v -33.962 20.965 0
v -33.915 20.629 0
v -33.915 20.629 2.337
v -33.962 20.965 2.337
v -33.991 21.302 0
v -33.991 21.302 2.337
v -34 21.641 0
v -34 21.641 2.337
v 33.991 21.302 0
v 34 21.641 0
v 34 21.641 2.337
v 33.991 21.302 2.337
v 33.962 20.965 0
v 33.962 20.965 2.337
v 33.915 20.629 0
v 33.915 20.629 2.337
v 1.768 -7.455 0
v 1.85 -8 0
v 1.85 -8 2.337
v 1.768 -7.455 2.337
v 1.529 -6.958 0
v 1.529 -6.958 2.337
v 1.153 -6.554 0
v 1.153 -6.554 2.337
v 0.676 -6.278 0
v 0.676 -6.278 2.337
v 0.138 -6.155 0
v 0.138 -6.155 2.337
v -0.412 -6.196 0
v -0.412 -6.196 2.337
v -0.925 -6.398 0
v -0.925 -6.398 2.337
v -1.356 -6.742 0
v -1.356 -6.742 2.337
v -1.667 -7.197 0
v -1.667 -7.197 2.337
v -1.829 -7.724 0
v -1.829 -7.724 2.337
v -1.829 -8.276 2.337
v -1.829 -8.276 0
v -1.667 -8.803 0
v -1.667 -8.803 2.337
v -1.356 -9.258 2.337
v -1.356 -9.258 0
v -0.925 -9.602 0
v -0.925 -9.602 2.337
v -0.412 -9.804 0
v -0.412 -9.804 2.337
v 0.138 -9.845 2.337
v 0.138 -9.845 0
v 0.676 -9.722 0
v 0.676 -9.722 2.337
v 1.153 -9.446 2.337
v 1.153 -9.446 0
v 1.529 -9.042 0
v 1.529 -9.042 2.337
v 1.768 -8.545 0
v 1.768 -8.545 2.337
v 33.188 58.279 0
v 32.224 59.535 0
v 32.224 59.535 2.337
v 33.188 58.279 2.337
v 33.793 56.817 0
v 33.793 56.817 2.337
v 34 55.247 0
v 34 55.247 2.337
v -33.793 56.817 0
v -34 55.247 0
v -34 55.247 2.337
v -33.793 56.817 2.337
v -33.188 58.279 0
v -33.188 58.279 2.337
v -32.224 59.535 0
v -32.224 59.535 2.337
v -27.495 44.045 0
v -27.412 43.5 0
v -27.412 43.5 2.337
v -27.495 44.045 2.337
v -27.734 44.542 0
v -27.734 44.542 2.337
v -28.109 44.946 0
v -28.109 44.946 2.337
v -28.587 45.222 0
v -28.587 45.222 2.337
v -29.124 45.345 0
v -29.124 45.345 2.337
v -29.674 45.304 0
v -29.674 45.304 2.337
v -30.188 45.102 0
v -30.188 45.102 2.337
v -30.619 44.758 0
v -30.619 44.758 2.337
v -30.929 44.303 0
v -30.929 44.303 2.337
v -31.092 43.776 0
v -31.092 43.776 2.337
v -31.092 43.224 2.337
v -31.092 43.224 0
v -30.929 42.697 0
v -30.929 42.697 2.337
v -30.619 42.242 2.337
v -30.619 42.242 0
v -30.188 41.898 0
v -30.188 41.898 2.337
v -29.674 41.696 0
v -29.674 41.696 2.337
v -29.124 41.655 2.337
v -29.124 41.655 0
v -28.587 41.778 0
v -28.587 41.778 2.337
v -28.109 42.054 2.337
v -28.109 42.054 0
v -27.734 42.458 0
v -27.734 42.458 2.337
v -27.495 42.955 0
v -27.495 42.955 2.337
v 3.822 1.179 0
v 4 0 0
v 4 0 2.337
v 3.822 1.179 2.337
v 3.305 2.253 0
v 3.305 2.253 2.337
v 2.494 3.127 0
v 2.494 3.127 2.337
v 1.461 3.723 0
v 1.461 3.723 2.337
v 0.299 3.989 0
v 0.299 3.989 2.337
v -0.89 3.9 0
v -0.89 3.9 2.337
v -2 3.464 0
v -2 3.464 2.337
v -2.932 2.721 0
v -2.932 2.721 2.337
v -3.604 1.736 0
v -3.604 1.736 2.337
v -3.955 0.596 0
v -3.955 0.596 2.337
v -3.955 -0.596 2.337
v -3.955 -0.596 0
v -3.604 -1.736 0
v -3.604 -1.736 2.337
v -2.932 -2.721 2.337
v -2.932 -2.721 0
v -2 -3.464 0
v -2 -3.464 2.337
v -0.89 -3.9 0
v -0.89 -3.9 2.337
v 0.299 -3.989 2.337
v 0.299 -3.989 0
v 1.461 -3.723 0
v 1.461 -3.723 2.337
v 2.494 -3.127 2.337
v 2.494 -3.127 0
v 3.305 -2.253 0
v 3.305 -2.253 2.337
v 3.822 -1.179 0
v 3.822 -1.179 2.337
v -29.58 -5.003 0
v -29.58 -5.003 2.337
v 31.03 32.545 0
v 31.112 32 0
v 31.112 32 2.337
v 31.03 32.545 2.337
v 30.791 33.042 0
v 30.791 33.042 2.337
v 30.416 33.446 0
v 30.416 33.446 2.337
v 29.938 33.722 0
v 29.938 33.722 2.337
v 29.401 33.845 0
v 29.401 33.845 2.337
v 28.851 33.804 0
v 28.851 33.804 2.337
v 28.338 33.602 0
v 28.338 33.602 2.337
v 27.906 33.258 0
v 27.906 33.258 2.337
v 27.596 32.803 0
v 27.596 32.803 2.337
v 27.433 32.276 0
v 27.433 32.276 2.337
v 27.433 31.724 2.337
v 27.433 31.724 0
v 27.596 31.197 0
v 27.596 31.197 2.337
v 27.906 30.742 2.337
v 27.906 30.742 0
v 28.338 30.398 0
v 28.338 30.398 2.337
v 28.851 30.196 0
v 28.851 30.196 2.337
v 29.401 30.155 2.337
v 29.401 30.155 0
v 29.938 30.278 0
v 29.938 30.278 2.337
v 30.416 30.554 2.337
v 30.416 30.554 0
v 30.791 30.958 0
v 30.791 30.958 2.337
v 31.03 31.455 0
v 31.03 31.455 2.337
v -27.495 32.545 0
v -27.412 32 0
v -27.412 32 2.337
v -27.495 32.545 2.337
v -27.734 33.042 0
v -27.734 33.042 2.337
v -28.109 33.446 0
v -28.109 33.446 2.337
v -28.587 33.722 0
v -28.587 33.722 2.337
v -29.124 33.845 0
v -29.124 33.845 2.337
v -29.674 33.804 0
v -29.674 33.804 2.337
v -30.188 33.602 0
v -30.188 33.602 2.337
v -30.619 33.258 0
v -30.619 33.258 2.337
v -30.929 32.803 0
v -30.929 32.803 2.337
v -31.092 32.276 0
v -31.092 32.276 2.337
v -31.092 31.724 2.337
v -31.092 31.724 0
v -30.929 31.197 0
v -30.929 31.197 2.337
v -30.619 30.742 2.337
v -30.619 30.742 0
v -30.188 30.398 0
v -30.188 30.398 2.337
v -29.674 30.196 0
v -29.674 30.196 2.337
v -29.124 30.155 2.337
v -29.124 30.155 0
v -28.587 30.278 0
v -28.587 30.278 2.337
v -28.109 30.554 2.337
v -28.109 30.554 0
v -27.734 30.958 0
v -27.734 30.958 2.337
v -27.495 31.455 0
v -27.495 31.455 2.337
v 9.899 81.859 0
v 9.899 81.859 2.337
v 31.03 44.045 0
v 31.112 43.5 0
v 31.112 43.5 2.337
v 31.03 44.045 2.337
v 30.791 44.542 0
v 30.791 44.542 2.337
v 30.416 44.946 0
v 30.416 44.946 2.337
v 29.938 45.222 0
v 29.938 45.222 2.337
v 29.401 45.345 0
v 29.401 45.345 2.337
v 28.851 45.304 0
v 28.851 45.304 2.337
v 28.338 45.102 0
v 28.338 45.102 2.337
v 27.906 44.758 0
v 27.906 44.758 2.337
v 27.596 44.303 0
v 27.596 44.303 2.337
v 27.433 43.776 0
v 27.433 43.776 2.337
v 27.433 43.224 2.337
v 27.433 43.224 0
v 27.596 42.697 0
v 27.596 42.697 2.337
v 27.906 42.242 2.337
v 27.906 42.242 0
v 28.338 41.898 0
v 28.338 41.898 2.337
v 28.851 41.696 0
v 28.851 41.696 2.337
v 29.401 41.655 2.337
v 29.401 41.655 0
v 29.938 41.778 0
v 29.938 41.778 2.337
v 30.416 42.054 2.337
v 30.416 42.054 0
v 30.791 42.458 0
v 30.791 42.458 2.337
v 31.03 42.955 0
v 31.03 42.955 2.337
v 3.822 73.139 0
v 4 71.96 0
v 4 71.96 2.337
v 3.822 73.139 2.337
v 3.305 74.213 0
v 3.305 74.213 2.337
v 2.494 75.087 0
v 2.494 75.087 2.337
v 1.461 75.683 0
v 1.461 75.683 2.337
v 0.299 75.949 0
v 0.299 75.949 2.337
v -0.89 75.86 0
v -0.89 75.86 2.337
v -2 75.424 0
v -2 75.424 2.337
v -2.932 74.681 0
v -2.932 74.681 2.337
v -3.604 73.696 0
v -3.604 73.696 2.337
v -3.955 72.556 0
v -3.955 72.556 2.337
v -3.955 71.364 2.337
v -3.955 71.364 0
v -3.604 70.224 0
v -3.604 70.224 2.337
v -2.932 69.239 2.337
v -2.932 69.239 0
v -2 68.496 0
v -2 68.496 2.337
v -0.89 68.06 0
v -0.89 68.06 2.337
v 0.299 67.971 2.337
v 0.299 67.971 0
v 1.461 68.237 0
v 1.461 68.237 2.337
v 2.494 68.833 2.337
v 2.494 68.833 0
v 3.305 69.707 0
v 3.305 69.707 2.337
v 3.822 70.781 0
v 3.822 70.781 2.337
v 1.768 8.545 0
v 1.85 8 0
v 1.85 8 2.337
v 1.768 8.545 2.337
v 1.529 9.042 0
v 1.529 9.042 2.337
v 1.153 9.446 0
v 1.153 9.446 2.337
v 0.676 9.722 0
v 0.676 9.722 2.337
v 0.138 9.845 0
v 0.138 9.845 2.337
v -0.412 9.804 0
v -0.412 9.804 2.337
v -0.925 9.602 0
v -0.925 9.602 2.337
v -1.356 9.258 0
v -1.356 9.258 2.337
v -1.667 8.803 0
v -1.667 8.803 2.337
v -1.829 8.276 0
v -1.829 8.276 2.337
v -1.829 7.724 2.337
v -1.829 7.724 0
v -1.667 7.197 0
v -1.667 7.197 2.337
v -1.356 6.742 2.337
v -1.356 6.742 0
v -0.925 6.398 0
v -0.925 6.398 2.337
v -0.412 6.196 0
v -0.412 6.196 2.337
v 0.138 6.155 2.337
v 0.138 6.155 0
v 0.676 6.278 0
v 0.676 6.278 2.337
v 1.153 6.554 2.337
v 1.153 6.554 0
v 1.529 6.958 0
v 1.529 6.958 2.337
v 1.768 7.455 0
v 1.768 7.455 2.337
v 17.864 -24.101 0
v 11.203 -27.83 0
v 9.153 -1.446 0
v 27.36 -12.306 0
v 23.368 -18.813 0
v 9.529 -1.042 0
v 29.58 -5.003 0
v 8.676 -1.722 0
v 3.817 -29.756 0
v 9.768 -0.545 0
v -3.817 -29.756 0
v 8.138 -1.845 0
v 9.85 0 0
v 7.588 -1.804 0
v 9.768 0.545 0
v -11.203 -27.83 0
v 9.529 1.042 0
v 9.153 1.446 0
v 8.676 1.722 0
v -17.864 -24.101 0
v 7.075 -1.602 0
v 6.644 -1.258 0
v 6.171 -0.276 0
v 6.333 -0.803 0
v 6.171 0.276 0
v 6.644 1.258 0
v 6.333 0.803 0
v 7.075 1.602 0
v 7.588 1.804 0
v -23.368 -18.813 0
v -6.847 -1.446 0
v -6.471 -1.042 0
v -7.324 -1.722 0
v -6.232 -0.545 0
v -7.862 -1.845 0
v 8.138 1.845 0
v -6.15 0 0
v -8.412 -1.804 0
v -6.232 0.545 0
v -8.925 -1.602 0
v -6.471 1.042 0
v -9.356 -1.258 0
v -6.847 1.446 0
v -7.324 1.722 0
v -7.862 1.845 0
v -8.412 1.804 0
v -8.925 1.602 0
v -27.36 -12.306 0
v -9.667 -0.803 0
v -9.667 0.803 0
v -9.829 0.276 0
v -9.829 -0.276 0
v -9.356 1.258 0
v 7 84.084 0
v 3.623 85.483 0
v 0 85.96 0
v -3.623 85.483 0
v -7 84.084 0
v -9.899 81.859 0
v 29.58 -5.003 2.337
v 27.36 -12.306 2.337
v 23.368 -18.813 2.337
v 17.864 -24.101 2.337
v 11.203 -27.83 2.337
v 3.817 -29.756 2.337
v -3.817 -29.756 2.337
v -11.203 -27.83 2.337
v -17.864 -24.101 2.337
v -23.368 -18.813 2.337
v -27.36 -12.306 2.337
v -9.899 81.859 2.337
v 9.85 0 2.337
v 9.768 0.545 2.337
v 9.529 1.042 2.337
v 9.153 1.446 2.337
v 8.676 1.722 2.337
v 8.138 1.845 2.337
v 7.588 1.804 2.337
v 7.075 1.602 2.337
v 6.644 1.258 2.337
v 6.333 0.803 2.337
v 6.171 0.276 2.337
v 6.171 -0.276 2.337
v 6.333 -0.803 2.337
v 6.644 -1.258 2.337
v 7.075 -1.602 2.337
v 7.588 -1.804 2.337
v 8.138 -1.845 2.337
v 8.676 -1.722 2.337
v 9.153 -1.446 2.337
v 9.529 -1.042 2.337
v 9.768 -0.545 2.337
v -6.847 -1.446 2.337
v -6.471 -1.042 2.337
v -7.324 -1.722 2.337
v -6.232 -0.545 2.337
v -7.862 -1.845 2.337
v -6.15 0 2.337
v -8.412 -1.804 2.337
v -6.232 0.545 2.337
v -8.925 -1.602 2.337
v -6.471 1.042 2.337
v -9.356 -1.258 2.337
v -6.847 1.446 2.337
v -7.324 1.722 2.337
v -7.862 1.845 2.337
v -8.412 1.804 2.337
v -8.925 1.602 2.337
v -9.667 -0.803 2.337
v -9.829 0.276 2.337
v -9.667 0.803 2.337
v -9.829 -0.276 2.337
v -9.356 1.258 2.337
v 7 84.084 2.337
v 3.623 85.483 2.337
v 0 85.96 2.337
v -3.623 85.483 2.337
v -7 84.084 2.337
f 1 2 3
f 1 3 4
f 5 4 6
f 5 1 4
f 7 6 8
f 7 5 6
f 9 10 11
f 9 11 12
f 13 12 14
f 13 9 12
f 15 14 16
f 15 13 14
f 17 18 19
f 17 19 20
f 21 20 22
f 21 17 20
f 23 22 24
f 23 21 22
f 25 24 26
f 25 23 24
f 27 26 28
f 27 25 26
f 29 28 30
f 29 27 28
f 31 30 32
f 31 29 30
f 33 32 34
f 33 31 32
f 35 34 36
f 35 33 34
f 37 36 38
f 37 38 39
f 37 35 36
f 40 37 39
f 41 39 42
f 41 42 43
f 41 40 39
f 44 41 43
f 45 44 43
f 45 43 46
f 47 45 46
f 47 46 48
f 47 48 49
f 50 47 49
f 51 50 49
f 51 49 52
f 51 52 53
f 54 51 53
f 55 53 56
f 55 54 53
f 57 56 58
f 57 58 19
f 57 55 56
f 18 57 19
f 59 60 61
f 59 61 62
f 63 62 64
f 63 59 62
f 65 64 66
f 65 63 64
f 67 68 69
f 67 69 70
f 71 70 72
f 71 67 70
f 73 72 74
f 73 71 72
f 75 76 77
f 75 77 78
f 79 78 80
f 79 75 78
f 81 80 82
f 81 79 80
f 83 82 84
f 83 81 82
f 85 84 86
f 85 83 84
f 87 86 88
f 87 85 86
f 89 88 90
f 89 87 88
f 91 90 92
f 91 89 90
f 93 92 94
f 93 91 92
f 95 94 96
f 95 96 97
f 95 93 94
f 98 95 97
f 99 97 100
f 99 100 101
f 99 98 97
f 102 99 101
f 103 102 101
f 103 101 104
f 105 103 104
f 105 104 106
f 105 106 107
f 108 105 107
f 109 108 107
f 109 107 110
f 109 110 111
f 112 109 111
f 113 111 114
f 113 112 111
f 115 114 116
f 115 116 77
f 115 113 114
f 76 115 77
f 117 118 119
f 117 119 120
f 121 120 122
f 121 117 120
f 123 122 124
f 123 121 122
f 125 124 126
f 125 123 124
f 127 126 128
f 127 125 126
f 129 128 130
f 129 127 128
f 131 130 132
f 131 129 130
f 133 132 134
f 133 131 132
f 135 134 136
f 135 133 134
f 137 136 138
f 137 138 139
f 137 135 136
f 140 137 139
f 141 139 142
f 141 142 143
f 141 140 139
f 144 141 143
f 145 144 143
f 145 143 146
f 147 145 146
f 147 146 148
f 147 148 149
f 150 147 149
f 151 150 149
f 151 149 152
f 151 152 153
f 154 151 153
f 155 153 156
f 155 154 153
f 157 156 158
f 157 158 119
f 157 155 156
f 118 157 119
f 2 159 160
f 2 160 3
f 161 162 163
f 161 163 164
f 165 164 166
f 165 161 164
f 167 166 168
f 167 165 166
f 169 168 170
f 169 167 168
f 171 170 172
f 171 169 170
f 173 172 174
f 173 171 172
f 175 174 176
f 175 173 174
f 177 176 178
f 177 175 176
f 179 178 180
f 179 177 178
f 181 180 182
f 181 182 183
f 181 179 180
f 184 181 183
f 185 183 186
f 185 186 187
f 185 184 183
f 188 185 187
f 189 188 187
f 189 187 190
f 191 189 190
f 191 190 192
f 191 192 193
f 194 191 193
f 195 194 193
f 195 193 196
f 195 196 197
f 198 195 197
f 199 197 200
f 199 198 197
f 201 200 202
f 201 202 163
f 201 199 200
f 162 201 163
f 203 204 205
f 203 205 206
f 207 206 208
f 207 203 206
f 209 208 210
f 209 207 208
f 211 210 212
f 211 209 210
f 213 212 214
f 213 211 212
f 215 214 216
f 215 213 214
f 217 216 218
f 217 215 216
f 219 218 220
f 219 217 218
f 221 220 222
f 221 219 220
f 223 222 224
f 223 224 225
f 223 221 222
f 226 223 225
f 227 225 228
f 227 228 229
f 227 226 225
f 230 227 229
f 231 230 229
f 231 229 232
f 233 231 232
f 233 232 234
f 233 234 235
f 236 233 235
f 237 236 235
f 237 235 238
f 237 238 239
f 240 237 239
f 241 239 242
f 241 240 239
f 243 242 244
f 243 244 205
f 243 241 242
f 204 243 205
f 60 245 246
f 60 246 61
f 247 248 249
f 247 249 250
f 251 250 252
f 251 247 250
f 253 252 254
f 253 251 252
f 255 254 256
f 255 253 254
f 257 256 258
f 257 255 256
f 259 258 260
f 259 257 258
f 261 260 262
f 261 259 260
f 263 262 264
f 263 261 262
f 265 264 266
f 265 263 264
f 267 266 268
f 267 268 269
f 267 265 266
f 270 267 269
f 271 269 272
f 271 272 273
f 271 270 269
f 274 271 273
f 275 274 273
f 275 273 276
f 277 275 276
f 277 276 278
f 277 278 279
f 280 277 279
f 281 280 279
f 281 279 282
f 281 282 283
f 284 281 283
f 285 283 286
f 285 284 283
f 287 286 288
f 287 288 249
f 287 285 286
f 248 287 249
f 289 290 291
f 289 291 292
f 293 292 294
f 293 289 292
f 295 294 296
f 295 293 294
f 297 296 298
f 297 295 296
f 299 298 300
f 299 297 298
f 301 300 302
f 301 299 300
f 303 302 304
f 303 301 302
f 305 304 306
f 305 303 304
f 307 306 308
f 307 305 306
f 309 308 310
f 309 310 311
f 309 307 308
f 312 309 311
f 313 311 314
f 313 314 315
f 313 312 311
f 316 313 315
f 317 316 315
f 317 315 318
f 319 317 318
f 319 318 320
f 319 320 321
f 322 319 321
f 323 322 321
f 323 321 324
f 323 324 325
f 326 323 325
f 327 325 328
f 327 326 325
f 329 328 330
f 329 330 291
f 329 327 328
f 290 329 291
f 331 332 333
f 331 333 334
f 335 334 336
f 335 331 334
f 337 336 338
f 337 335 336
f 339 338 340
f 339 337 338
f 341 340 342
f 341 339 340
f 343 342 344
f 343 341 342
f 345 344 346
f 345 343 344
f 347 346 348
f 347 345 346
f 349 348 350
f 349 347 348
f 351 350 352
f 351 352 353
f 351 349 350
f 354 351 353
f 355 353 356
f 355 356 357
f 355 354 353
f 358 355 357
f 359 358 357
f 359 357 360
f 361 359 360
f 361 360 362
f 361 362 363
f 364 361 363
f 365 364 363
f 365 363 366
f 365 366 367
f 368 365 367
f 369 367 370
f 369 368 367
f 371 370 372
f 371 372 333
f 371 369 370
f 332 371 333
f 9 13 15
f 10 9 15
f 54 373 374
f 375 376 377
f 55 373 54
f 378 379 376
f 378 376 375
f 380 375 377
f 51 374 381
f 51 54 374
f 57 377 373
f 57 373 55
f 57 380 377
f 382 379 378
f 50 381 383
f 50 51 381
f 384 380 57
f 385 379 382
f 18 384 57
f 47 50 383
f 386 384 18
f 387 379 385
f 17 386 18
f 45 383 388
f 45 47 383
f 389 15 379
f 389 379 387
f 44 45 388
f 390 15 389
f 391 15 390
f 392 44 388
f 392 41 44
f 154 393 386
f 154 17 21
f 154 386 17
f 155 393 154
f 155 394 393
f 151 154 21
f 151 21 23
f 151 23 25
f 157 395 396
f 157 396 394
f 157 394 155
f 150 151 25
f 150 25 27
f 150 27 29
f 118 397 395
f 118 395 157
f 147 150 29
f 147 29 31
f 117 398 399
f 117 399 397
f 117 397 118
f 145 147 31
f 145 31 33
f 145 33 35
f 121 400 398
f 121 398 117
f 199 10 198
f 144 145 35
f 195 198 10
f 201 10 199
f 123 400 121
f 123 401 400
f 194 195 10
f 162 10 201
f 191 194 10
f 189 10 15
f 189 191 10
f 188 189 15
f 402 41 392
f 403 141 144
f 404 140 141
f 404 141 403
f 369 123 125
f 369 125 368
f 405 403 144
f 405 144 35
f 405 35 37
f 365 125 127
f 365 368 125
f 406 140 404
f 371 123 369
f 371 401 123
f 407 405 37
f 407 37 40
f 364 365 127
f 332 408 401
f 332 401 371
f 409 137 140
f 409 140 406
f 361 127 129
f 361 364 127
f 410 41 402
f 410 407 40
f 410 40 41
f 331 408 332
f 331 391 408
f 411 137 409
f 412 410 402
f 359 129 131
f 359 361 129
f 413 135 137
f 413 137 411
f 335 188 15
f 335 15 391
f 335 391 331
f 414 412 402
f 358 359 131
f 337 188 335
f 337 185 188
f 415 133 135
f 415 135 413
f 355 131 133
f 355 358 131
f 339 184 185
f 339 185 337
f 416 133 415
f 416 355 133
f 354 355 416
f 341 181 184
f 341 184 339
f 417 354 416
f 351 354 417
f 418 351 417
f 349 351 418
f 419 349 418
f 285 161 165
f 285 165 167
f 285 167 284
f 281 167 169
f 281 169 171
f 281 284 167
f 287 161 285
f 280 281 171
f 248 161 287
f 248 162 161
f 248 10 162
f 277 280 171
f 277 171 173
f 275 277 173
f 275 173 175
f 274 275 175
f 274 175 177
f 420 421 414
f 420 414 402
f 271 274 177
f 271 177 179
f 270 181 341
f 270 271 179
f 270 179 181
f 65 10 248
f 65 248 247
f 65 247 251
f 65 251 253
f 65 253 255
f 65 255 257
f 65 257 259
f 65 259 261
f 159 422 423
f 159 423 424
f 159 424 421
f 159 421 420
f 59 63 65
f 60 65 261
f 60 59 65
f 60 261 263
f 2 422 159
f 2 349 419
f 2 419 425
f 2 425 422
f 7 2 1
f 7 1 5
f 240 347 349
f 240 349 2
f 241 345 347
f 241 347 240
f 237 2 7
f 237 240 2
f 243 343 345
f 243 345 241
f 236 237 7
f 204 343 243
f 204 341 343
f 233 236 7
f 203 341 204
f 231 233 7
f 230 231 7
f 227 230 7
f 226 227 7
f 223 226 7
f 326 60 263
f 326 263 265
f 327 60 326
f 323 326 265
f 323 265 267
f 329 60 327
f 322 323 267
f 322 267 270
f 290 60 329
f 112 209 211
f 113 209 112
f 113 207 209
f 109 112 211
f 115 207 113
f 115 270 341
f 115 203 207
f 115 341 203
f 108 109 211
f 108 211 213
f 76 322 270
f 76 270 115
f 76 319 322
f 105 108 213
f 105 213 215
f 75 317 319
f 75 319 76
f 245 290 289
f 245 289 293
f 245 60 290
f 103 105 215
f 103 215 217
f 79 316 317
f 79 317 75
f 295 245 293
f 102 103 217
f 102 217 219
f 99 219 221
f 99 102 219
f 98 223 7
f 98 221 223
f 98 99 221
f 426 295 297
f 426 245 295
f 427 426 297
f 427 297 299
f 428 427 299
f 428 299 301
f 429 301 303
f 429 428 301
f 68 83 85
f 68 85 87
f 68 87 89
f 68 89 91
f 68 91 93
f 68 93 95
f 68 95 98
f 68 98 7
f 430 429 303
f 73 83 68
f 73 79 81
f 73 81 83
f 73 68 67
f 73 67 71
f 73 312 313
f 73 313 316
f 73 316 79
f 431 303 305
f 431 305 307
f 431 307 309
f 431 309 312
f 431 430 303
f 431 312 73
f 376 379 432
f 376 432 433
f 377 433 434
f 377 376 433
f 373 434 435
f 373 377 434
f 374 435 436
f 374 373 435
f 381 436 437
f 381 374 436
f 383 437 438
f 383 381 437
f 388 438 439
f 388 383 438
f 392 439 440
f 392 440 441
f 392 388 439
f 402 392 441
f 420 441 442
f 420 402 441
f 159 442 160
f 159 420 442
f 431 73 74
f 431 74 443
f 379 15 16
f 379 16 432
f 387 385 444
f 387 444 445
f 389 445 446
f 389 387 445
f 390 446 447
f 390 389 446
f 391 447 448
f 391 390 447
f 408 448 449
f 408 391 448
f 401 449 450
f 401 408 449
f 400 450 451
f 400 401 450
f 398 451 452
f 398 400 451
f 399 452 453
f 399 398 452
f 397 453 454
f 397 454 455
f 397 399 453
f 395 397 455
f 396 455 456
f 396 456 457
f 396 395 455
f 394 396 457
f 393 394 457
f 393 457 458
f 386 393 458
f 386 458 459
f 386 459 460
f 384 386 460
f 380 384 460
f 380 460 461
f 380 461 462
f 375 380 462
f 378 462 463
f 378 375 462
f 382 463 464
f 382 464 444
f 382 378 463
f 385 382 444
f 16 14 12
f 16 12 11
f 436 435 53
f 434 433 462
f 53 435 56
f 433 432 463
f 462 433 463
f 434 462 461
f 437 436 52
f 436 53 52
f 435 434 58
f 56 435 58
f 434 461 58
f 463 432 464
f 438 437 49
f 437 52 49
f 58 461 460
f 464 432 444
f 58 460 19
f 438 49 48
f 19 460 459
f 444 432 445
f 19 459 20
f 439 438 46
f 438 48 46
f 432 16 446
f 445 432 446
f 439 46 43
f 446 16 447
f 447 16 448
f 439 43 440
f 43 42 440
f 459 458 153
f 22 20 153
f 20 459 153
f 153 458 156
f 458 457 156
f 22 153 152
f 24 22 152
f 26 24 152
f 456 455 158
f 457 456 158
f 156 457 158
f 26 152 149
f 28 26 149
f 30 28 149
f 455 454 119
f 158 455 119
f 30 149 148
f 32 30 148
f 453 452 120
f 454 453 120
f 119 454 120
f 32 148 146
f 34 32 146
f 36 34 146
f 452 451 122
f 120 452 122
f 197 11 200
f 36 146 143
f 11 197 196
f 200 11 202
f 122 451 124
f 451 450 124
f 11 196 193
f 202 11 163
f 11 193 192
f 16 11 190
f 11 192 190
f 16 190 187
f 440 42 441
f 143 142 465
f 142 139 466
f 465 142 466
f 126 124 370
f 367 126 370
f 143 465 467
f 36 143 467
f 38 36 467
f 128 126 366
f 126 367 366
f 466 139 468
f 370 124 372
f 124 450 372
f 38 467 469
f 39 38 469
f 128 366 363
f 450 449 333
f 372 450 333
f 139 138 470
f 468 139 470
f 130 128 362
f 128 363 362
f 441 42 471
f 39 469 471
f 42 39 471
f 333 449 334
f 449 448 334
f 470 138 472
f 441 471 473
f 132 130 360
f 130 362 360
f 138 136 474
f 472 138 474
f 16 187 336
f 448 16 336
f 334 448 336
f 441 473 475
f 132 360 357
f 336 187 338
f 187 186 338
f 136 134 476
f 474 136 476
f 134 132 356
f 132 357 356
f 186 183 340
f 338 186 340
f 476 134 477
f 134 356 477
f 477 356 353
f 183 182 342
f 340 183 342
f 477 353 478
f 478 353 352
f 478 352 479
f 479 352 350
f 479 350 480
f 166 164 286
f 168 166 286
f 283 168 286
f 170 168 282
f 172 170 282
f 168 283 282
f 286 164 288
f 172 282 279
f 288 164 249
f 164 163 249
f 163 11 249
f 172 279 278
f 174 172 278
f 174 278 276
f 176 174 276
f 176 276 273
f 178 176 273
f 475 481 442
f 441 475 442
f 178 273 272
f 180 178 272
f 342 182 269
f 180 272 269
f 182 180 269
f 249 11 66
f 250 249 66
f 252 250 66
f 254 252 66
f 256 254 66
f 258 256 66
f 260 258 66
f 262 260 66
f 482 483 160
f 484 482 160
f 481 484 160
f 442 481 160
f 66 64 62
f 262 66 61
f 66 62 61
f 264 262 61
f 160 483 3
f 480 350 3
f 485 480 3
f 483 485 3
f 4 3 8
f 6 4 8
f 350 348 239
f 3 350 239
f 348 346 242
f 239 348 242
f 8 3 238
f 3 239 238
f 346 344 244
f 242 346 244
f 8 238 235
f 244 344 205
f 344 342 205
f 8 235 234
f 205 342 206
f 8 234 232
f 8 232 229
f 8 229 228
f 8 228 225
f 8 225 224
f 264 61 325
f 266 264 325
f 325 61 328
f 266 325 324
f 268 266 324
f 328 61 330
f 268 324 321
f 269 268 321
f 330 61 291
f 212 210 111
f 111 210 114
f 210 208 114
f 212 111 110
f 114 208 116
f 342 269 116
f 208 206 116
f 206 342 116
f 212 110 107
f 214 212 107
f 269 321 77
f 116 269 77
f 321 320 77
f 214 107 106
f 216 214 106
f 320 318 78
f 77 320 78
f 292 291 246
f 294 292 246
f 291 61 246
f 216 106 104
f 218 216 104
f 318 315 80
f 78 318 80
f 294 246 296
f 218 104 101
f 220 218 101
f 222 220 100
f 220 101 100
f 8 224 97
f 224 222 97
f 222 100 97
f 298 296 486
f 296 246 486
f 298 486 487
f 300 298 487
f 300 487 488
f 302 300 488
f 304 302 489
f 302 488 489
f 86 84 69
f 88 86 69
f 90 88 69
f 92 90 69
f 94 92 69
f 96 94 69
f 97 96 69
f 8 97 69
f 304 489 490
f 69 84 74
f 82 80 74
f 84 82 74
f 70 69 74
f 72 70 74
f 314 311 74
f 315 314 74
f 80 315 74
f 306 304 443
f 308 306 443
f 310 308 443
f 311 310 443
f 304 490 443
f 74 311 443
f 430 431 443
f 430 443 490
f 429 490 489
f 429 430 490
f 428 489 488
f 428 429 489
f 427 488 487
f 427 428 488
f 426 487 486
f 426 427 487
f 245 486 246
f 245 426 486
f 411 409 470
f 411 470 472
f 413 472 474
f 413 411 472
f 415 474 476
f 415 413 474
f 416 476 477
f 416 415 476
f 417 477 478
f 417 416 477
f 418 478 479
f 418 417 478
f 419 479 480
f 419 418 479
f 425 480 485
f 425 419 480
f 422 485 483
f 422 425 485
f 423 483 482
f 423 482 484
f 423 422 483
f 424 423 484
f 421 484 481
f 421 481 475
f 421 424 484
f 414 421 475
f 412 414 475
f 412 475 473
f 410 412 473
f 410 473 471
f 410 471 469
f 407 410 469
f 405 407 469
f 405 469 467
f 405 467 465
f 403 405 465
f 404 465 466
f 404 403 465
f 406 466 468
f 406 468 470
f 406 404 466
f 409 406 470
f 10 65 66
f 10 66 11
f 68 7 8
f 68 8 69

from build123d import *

# Parameters (mm, degrees)
SKETCH1_R           = 4
SKETCH1_R_2         = 1.85
BOSS_EXTRUDE1_DEPTH = 2.3368


with BuildPart() as part:
    # Sketch1 → Boss-Extrude1 (new body)
    with BuildSketch(Plane.XY):
        with BuildLine():
            Line((-29.579916475, -5.002853321), (-33.915090683, 20.629337502))
            ThreePointArc((-33.915090683, 20.629337502), (-33.978735385, 21.133158673), (-34, 21.640538448))
            Line((-34, 21.640538448), (-34, 55.247304326))
            ThreePointArc((-34, 55.247304326), (-33.538424872, 57.567799195), (-32.223970118, 59.535019756))
            Line((-32.223970118, 59.535019756), (-9.899494937, 81.859494937))
            ThreePointArc((-9.899494937, 81.859494937), (0, 85.96), (9.899494937, 81.859494937))
            Line((9.899494937, 81.859494937), (32.223970118, 59.535019756))
            ThreePointArc((32.223970118, 59.535019756), (33.538424872, 57.567799195), (34, 55.247304326))
            Line((34, 55.247304326), (34, 21.640538448))
            ThreePointArc((34, 21.640538448), (33.978735385, 21.133158673), (33.915090683, 20.629337502))
            Line((33.915090683, 20.629337502), (29.579916475, -5.002853321))
            ThreePointArc((29.579916475, -5.002853321), (0, -30), (-29.579916475, -5.002853321))
        make_face()
        Circle(SKETCH1_R, mode=Mode.SUBTRACT)
        with Locations((0, 8)):
            Circle(SKETCH1_R_2, mode=Mode.SUBTRACT)
        with Locations((-8, 0)):
            Circle(SKETCH1_R_2, mode=Mode.SUBTRACT)
        with Locations((0, -8)):
            Circle(SKETCH1_R_2, mode=Mode.SUBTRACT)
        with Locations((8, 0)):
            Circle(SKETCH1_R_2, mode=Mode.SUBTRACT)
        with Locations((0, 71.96)):
            Circle(SKETCH1_R, mode=Mode.SUBTRACT)
        with Locations((-29.2625, 32)):
            Circle(SKETCH1_R_2, mode=Mode.SUBTRACT)
        with Locations((29.2625, 43.5)):
            Circle(SKETCH1_R_2, mode=Mode.SUBTRACT)
        with Locations((29.2625, 32)):
            Circle(SKETCH1_R_2, mode=Mode.SUBTRACT)
        with Locations((-29.2625, 43.5)):
            Circle(SKETCH1_R_2, mode=Mode.SUBTRACT)
    extrude(amount=BOSS_EXTRUDE1_DEPTH)


solid = part.part
